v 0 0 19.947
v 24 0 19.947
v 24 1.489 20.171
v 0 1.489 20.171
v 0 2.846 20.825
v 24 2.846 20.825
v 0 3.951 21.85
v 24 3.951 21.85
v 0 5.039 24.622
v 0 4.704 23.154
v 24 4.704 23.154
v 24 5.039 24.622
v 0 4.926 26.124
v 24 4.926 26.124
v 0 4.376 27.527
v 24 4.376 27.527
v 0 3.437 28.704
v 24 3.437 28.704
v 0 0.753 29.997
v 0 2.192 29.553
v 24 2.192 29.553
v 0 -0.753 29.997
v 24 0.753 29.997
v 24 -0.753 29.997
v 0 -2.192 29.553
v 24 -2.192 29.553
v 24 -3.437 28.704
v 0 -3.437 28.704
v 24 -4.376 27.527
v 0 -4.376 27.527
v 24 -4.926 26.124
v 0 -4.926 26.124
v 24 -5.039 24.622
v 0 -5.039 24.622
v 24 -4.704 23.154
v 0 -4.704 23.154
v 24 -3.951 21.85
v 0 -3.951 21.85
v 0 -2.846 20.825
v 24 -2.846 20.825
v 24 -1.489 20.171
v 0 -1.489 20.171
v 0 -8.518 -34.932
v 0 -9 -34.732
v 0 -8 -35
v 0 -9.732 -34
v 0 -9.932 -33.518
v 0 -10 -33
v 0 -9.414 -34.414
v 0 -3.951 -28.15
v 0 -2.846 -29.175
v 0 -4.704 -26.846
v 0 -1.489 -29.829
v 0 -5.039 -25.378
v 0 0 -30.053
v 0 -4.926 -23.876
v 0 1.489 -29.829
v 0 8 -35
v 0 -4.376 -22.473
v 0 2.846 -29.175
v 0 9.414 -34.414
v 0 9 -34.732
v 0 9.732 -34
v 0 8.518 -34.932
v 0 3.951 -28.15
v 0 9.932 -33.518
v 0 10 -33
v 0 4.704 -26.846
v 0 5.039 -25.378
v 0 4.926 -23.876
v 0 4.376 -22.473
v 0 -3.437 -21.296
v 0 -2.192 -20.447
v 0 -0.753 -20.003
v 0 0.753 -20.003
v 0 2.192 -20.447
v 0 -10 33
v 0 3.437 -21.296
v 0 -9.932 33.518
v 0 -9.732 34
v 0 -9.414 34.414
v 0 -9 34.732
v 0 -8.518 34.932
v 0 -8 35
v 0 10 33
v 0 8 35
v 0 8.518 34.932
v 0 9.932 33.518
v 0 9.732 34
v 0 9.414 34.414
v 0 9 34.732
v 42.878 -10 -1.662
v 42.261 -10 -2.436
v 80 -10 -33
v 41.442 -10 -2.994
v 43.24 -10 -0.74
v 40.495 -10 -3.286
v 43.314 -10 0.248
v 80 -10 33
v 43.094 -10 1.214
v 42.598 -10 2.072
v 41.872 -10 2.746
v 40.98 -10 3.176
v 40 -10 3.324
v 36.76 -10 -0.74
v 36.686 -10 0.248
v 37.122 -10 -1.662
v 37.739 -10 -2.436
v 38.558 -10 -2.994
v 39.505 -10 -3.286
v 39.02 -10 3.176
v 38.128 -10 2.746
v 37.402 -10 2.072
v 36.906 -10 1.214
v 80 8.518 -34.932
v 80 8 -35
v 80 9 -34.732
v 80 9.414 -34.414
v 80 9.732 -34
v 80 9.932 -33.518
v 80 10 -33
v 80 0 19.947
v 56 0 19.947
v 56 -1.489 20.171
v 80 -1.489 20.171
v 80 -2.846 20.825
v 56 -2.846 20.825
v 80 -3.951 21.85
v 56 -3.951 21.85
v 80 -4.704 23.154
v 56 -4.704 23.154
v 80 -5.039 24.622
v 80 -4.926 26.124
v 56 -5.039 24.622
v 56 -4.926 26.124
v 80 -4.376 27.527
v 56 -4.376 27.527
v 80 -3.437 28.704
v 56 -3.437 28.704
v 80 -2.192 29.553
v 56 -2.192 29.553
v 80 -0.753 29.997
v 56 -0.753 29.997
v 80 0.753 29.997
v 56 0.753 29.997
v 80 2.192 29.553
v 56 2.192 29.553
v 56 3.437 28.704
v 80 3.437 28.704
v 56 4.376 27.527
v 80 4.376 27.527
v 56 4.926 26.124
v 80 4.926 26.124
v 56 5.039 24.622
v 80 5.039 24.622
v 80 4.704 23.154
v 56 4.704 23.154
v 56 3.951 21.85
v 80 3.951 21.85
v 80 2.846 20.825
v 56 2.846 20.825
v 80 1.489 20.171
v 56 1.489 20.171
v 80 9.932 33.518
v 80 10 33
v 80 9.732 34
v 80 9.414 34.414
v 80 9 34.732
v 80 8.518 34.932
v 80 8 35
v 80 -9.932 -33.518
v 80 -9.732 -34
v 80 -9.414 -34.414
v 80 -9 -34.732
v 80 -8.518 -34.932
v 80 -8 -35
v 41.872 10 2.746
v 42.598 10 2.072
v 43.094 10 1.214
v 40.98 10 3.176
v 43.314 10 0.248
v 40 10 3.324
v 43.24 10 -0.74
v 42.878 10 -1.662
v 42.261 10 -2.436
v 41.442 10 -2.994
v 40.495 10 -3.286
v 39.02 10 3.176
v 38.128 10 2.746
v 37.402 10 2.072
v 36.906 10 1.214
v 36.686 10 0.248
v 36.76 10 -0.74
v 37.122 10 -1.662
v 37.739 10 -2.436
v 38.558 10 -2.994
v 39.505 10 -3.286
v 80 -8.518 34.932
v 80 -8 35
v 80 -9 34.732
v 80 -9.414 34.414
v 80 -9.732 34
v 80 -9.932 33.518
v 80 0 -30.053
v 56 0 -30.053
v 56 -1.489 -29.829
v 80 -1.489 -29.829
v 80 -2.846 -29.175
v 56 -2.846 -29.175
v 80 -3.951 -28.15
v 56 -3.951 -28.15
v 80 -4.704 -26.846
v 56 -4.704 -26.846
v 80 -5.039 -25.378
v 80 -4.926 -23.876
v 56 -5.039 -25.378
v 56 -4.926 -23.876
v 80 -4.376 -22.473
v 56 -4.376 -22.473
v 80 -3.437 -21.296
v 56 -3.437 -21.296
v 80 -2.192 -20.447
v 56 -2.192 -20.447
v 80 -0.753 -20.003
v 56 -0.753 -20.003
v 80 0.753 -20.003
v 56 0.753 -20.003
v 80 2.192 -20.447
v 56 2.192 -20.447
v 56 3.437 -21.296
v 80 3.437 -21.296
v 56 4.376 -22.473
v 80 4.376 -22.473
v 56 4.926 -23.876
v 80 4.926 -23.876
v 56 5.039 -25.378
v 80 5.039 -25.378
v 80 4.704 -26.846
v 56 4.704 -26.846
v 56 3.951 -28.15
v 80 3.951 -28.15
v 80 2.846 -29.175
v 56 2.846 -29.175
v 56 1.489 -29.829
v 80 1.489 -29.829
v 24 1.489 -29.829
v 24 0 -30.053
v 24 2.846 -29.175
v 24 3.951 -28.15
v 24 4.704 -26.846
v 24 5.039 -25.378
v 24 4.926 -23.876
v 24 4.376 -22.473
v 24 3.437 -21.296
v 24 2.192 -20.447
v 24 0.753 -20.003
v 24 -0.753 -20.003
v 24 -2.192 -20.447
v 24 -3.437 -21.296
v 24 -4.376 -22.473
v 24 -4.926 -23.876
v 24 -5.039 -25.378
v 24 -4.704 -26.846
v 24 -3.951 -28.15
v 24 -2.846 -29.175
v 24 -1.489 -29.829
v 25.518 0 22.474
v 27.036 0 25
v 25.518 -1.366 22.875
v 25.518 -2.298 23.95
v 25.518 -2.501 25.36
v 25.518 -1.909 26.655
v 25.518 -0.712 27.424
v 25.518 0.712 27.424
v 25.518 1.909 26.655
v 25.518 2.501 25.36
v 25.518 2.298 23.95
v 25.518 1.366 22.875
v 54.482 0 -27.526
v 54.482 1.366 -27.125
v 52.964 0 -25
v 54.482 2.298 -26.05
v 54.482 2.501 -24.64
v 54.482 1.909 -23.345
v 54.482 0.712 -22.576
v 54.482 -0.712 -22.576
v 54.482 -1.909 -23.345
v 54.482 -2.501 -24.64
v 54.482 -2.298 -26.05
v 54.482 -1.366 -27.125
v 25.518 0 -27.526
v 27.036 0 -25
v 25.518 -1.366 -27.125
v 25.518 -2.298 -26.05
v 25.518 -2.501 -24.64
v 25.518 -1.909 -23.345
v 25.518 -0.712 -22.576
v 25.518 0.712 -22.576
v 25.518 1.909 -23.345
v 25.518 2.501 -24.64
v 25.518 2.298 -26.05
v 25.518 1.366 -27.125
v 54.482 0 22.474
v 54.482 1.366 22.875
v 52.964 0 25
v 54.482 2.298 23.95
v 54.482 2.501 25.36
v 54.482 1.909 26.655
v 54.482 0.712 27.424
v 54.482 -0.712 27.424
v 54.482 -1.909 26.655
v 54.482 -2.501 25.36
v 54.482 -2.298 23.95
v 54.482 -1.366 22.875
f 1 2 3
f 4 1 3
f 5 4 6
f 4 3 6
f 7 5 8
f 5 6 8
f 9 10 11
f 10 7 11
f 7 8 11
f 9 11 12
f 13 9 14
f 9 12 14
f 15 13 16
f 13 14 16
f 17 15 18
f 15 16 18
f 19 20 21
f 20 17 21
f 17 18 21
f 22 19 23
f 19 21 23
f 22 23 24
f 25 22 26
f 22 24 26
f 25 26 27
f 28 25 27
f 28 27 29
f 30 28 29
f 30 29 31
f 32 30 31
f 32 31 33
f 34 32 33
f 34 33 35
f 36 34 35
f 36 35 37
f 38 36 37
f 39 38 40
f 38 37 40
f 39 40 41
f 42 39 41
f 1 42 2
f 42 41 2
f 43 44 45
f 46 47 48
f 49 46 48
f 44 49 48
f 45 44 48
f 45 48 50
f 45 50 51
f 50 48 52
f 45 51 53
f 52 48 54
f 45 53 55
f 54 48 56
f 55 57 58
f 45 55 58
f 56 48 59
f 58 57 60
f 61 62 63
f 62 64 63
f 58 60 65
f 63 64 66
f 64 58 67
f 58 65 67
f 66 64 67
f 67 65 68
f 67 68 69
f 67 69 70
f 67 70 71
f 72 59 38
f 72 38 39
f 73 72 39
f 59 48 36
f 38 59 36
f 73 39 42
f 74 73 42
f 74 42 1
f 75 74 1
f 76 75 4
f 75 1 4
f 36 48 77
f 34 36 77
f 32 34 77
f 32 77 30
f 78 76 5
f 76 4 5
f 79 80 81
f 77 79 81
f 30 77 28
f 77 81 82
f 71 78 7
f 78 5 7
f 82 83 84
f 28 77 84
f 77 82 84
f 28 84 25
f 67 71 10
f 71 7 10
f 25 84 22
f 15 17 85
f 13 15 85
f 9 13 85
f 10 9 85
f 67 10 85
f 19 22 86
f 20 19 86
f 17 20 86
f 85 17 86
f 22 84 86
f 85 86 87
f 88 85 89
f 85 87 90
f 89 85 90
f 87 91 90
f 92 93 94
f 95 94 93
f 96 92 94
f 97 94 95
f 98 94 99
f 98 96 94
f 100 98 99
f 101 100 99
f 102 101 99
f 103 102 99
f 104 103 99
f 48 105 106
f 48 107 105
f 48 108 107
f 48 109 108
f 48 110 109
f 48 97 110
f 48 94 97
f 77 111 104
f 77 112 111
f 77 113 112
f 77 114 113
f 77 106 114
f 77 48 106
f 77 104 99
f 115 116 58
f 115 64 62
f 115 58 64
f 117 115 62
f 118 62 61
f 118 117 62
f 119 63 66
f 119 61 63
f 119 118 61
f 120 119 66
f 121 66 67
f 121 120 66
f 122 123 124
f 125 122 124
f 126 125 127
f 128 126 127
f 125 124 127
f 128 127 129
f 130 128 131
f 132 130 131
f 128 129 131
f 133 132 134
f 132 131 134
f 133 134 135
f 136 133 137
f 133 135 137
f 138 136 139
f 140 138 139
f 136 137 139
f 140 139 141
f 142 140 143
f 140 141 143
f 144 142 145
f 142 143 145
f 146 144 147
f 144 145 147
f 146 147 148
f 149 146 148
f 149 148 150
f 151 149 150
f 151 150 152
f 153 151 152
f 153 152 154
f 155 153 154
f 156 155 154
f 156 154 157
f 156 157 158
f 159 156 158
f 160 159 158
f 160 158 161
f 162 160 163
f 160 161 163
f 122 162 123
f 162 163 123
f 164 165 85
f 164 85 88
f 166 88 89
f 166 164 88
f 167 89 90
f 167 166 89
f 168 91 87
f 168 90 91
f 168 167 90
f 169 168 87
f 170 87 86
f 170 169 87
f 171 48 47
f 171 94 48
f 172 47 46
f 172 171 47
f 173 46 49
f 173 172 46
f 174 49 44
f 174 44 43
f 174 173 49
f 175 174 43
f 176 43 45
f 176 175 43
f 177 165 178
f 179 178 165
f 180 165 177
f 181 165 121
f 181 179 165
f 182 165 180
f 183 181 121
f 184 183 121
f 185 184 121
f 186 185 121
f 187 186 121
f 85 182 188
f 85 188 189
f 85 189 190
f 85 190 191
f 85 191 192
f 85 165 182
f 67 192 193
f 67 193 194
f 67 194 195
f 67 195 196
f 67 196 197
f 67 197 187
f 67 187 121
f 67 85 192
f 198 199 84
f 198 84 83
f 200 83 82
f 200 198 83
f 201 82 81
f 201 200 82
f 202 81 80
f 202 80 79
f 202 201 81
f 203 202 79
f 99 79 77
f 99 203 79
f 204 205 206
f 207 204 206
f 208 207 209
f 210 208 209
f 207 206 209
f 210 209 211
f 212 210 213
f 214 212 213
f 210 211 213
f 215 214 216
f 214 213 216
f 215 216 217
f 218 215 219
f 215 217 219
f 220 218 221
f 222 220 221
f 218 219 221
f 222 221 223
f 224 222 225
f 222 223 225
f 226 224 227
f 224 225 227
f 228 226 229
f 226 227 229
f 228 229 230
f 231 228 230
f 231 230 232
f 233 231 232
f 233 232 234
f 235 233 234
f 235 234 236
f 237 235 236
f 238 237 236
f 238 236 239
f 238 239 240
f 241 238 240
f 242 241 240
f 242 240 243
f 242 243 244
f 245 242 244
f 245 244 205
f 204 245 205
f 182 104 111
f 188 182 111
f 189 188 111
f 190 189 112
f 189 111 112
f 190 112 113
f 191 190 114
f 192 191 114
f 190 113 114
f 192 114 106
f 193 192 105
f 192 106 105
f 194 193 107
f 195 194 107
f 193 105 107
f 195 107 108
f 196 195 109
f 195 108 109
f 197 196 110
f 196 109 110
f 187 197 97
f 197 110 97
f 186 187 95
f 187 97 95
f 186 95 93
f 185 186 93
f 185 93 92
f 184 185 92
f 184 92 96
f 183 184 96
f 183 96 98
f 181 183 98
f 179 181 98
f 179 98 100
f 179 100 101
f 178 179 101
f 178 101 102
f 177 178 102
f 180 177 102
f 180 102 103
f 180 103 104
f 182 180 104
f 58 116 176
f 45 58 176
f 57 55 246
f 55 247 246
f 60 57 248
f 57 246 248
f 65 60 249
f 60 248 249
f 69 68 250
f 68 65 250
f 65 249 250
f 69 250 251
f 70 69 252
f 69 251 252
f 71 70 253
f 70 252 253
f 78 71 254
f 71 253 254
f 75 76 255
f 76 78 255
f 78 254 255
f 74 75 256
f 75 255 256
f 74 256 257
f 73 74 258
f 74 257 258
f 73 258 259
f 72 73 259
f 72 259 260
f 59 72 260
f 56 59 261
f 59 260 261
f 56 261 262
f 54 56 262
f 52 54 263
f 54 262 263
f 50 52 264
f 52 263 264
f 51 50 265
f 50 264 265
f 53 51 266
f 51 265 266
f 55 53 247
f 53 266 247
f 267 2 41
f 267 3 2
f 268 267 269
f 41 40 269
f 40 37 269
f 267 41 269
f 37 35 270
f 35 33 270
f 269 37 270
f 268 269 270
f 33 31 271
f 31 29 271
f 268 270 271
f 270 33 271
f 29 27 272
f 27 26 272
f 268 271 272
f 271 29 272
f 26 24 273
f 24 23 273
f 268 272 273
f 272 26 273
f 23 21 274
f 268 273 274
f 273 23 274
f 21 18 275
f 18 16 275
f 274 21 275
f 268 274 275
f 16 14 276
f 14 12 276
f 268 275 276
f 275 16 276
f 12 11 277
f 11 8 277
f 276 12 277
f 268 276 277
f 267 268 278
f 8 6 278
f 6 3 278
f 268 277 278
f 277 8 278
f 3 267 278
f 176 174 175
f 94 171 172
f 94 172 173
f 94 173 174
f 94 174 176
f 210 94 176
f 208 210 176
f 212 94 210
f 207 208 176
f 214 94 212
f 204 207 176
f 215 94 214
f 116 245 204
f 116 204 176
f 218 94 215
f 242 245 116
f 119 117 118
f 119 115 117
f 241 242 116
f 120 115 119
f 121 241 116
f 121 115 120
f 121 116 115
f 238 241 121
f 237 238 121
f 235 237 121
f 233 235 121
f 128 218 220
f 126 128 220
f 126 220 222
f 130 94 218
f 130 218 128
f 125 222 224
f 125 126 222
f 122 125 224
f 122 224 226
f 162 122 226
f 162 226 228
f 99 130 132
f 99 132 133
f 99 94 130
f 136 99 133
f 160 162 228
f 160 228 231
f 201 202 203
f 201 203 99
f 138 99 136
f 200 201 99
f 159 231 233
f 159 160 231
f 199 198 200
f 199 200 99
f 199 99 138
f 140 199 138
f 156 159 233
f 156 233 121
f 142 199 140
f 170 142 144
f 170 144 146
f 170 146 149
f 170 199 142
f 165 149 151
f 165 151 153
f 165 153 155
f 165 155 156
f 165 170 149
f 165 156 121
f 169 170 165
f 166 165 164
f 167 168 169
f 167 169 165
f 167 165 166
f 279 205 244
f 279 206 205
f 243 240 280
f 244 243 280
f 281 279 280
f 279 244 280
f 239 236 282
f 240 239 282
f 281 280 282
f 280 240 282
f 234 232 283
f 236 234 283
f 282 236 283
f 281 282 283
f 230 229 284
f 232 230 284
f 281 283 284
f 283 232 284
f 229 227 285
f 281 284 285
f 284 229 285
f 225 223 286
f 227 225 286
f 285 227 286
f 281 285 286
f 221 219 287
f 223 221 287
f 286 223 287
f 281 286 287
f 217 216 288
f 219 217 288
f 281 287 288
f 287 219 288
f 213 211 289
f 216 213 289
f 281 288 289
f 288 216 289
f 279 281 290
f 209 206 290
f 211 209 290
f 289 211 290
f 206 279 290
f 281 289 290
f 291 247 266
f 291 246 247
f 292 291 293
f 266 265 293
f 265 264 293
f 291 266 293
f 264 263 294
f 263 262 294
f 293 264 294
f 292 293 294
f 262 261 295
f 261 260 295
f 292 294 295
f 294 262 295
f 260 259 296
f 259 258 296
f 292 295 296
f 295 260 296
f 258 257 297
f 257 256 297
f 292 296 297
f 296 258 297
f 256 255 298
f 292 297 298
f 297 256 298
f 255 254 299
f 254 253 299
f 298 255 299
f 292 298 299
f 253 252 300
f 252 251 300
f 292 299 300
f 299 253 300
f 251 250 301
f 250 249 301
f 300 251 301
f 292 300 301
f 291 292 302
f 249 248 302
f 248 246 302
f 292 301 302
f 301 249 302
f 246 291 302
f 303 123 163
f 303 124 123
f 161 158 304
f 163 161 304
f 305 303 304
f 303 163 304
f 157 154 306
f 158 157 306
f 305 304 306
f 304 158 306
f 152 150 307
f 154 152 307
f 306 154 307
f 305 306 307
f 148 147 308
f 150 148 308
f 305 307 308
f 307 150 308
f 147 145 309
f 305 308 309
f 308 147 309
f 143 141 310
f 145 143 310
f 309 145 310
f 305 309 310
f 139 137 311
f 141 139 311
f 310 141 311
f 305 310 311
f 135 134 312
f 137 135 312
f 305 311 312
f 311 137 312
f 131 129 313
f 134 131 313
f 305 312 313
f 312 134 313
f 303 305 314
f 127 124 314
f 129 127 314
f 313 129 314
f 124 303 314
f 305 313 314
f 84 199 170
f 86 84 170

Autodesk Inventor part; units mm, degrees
ref_plane "YZ Plane" through (0, 0, 0) normal (1, 0, 0) x (0, 1, 0)
ref_plane "XZ Plane" through (0, 0, 0) normal (0, 1, 0) x (-1, 0, 0)
sketch "Sketch1" plane through (0, 0, 0) normal (1, 0, 0) x (0, 1, 0)
  line L0 (-10, 35) -> (10, 35)
  line L1 (10, 35) -> (10, -35)
  line L2 (10, -35) -> (-10, -35)
  line L3 (-10, -35) -> (-10, 35)
  line L4 (-10, 35) -> (10, -35) construction
  line L5 (10, 35) -> (-10, -35) construction
  point P0 (0, 0)
  dimension "d0" = 20
  dimension "d1" = 70
extrude "Extrusion1" add sketch "Sketch1" along normal blind 80
sketch "Sketch2" plane through (80, 0, 0) normal (1, 0, 0) x (0, 0, -1)
  line L0 (-35, 10) -> (-35, -10) projected
  line L1 (-35, 0) -> (35, 0)
  line L2 (35, -10) -> (35, 10) projected
  line L3 (35, 10) -> (-35, 10) projected
  line L4 (0, 10) -> (0, -10)
  line L5 (-35, -10) -> (35, -10) projected
  point P0 (0, 0)
  point P1 (-25, 0)
  point P2 (25, 0)
  dimension "d4" = 25
hole "Hole1" at (80, 0, 25) at (80, 0, -25) direction (-1, 0, 0) diameter 10.106 depth 24 tip angle 118 thread size "M12x1.75" class "6H" standard "ISO Metric profile"
ref_plane "Work Plane1" through (40, 0, 0) normal (1, 0, 0) x (0, 0, -1)
mirror "Mirror1" about plane through (40, 0, 0) normal (1, 0, 0) of "Hole1"
fillet "Fillet1" radius 2 4 edges at (40, 10, 35) (40, -10, 35) (40, -10, -35) (40, 10, -35)
sketch "Sketch3" plane through (0, 10, 33) normal (0, 1, 0) x (1, 0, 0)
  line L0 (80, 0) -> (80, 66) projected
  line L1 (80, 33) -> (0, 33)
  point P0 (40, 33)
hole "Hole2" at (40, 10, 0) direction (0, -1, 0) diameter 6.647 end through all thread size "M8x1.25" class "6H" standard "ISO Metric profile"
properties part number "Profile_Middle_03"
